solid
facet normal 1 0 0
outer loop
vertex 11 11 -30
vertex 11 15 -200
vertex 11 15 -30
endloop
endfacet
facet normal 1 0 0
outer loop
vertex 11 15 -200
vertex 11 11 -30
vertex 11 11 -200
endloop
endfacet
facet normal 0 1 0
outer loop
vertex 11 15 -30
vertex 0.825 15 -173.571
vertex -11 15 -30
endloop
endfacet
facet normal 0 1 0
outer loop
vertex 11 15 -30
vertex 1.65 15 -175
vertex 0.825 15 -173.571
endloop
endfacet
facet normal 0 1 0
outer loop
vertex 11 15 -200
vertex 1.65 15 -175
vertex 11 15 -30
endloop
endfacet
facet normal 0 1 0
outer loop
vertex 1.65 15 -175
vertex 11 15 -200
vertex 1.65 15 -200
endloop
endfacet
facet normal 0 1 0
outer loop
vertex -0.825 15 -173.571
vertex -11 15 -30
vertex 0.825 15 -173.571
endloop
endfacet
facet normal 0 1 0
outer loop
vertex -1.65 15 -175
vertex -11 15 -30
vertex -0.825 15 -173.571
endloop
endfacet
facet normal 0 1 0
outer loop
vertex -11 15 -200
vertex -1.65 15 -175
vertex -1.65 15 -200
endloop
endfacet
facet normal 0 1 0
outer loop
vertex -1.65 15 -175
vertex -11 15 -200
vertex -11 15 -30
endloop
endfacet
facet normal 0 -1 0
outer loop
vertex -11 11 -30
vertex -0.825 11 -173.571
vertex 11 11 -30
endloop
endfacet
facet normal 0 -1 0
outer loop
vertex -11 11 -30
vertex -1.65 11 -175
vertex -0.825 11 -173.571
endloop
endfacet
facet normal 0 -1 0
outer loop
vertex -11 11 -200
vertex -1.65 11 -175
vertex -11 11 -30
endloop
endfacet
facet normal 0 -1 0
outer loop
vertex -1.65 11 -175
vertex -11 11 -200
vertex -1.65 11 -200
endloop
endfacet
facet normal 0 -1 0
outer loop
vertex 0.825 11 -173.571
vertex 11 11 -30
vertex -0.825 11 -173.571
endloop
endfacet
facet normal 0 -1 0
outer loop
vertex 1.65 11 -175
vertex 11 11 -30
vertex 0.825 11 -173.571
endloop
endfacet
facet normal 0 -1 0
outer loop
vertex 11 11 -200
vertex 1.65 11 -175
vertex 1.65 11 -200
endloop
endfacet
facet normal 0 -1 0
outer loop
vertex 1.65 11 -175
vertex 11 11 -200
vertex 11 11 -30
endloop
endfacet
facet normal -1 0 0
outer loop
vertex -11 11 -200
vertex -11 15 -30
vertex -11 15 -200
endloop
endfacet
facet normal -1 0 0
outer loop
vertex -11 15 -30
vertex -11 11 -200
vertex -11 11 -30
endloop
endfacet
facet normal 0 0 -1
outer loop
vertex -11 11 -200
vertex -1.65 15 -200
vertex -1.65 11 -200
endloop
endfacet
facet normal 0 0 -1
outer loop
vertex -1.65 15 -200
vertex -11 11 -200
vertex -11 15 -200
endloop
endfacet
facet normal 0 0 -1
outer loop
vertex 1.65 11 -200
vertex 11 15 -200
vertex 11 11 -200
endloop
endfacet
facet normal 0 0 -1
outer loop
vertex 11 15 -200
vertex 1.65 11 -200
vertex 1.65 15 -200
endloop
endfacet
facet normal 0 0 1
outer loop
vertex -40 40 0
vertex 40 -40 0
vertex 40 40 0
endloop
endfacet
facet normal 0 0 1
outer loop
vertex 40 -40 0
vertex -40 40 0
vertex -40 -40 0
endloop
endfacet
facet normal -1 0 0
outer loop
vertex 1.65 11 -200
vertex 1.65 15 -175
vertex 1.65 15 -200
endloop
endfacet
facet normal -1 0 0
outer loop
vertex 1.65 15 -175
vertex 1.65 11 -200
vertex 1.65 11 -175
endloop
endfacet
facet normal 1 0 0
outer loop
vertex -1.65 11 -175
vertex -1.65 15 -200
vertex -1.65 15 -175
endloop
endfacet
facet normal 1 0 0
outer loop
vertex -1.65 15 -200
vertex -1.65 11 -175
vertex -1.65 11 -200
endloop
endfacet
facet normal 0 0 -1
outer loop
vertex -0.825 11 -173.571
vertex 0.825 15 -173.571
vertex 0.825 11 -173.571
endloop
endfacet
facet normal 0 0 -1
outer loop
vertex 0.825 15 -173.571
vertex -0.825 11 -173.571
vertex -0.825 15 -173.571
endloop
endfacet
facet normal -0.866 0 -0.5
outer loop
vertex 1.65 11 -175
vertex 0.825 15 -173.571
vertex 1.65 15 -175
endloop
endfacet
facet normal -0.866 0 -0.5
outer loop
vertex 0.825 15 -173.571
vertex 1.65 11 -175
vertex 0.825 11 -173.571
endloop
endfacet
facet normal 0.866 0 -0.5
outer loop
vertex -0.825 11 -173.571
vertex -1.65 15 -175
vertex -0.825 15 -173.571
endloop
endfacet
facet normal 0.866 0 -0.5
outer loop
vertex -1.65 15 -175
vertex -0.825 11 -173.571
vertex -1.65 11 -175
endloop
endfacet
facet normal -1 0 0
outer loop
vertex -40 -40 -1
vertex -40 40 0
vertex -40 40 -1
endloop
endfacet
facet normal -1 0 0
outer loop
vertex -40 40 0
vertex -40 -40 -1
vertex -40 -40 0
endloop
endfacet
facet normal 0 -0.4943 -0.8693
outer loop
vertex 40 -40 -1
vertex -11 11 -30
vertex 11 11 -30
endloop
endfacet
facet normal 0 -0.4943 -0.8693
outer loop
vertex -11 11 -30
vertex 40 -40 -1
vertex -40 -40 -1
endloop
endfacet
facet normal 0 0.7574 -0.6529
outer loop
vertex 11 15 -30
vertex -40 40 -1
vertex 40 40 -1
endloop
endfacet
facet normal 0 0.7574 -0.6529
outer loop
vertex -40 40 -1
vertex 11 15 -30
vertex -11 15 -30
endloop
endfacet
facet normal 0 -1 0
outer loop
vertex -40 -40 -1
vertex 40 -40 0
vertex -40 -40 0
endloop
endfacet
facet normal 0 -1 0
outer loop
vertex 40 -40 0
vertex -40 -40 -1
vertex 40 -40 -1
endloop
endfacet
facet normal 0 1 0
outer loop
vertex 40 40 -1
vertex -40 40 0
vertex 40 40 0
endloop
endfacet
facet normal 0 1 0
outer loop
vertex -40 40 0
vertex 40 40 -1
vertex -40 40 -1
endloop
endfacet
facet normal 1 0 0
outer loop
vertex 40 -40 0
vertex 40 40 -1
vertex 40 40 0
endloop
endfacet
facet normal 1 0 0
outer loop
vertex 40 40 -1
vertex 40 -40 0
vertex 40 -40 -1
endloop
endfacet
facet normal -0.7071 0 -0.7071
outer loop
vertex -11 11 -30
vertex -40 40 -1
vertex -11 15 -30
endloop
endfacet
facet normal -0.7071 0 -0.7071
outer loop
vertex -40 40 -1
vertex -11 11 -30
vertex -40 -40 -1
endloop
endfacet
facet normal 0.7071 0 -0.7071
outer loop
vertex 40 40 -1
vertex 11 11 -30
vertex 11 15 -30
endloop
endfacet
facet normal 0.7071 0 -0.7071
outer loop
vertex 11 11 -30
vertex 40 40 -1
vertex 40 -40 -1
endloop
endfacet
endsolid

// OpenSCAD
base_lengh = 80;
base_height = 30;
wall_thickness = 4;
mount_hole_size = 3.3;
pad_size = 22;
stand_height = 200;

mirror([0,0,1]){hull(){
    translate([-base_lengh/2, -base_lengh/2, 0])cube([base_lengh, base_lengh, 1]);
    translate([-pad_size/2, pad_size/2, base_height-1])cube([pad_size, wall_thickness, 1]);
}}
translate([-pad_size/2, pad_size/2, 0])rotate([-90, 0, 0])difference(){
    cube([pad_size, stand_height, wall_thickness]);
    translate([pad_size/2, stand_height-25, 0])translate([-mount_hole_size/2, 0, 0])cube([mount_hole_size, 25, wall_thickness]);
    translate([pad_size/2, stand_height-25, 0])cylinder(wall_thickness, mount_hole_size/2, mount_hole_size/2);
}
